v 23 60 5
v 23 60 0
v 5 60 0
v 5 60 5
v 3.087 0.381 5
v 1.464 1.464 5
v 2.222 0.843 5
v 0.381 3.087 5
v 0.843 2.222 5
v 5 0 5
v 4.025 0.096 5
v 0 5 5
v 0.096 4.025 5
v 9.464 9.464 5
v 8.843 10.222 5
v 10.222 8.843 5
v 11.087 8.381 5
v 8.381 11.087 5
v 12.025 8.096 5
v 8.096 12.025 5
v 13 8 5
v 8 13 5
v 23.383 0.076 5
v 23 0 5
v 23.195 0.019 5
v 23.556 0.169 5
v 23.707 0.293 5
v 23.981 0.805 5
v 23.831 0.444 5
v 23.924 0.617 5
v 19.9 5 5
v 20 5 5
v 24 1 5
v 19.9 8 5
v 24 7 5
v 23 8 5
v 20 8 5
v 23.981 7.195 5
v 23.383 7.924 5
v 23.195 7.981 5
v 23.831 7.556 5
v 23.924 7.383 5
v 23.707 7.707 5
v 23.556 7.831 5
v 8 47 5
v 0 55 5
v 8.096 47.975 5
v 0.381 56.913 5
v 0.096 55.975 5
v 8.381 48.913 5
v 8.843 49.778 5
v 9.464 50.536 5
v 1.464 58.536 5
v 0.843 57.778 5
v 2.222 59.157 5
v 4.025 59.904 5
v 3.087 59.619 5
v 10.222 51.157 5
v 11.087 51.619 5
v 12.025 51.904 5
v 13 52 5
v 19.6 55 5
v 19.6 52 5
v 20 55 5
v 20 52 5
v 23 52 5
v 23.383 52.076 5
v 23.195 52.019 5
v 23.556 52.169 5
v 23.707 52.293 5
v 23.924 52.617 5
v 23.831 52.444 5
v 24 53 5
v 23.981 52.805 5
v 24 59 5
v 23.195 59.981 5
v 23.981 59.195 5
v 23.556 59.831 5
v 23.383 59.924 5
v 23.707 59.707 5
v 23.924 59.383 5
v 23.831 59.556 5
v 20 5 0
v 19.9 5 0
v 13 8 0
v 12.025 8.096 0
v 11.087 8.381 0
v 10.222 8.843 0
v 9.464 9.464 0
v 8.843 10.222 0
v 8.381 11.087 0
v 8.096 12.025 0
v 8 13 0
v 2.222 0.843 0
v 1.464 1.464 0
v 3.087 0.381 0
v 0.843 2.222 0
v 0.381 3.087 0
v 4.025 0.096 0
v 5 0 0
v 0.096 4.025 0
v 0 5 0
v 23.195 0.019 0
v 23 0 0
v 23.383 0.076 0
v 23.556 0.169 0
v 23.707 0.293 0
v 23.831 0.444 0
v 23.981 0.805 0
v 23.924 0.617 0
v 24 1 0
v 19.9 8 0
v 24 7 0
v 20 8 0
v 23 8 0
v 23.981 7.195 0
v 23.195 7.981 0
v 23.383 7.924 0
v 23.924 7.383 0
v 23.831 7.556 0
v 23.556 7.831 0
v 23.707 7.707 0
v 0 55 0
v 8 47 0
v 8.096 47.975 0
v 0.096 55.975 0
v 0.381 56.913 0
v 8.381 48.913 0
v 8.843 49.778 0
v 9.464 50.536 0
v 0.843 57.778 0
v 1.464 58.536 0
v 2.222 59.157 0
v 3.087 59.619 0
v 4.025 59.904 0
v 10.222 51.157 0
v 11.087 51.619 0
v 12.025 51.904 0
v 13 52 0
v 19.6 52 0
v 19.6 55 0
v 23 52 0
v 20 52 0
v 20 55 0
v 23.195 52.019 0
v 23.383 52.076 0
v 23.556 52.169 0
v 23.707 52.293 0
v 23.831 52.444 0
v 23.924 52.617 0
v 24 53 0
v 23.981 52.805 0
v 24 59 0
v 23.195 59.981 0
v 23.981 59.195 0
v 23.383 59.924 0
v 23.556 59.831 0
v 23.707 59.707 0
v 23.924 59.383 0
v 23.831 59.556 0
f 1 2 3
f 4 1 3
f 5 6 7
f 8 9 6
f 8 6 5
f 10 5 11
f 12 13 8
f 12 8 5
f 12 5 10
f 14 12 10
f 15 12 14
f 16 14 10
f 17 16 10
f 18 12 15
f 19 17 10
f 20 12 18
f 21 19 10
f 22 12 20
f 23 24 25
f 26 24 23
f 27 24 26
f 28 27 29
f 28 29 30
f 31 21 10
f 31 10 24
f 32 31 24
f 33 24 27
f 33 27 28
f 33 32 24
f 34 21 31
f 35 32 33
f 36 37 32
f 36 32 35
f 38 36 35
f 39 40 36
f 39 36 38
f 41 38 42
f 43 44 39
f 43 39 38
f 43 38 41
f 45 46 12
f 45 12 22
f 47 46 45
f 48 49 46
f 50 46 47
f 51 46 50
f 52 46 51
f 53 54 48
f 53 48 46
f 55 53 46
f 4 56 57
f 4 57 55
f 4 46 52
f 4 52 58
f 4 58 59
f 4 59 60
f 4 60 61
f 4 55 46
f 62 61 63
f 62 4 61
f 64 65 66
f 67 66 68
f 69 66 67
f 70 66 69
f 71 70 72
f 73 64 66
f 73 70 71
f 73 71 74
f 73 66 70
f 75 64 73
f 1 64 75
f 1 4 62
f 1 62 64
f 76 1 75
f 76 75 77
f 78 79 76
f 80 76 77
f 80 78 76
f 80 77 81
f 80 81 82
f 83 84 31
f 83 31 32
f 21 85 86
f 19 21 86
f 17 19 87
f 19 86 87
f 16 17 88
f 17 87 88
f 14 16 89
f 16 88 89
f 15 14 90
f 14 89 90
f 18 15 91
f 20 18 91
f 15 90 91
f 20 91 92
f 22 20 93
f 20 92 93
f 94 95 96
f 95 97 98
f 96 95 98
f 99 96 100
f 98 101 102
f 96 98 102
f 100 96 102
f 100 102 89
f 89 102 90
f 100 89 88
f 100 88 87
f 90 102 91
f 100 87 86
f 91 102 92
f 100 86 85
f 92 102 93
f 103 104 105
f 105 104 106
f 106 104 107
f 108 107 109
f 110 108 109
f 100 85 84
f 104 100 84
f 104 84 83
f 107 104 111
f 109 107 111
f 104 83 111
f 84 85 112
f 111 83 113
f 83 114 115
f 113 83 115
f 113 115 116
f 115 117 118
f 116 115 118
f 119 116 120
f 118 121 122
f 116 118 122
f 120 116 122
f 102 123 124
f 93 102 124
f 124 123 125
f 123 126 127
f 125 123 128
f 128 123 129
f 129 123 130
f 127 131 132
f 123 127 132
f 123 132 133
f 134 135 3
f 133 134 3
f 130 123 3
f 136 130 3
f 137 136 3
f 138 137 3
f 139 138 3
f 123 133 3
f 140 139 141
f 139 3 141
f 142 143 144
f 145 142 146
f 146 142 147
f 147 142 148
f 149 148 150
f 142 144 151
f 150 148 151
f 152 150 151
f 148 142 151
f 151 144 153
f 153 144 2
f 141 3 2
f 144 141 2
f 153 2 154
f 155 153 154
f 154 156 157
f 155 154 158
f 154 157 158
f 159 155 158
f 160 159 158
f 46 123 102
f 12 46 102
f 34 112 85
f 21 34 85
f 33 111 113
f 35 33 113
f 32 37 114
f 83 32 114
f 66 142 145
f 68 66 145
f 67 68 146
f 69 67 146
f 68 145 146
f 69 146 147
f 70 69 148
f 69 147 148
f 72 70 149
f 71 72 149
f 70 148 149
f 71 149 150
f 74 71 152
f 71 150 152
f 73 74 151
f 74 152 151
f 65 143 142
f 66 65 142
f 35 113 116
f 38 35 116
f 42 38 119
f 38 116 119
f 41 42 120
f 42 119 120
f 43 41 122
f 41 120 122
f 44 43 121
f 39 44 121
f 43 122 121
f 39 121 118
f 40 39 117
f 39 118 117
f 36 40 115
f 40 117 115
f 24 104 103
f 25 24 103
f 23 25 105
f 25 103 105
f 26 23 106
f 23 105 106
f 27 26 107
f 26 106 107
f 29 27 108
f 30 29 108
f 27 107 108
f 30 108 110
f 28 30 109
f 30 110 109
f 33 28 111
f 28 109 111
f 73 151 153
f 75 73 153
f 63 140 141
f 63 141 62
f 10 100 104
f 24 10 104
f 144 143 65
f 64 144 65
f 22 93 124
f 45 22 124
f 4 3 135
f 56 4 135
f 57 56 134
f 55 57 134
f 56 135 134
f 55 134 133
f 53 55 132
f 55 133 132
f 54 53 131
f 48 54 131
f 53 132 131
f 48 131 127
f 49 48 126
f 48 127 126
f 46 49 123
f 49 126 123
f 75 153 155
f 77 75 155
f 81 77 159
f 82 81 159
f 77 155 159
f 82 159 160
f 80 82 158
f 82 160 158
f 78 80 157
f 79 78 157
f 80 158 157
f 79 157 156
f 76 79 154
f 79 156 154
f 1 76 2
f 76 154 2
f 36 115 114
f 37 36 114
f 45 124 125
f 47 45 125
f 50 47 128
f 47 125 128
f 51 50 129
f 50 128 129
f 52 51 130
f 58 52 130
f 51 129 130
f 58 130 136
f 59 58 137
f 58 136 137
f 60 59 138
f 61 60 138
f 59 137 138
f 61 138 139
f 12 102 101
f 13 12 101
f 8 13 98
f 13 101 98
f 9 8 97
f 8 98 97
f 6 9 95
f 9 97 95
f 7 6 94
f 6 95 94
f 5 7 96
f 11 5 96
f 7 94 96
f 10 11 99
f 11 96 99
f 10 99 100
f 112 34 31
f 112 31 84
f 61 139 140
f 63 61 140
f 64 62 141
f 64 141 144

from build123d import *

# Parameters (mm, degrees)
BOSS_EXTRUDE1_DEPTH = 5
SKETCH3_W           = 0.1
SKETCH3_H           = 5
CUT_EXTRUDE1_DEPTH  = 3
SKETCH4_W           = 0.4
SKETCH4_H           = 5
CUT_EXTRUDE2_DEPTH  = 3


with BuildPart() as part:
    # Sketch1 → Boss-Extrude1 (new body)
    with BuildSketch(Plane.XY):
        with BuildLine():
            Line((0, 55), (0, 5))
            ThreePointArc((0, 5), (1.464466094, 1.464466094), (5, 0))
            Line((5, 0), (23, 0))
            ThreePointArc((23, 0), (23.707106781, 0.292893219), (24, 1))
            Line((24, 1), (24, 7))
            ThreePointArc((24, 7), (23.707106781, 7.707106781), (23, 8))
            Line((23, 8), (13, 8))
            ThreePointArc((13, 8), (9.464466094, 9.464466094), (8, 13))
            Line((8, 13), (8, 47))
            ThreePointArc((8, 47), (9.464466094, 50.535533906), (13, 52))
            Line((13, 52), (23, 52))
            ThreePointArc((23, 52), (23.707106781, 52.292893219), (24, 53))
            Line((24, 53), (24, 59))
            ThreePointArc((24, 59), (23.707106781, 59.707106781), (23, 60))
            Line((23, 60), (5, 60))
            ThreePointArc((5, 60), (1.464466094, 58.535533906), (0, 55))
        make_face()
    extrude(amount=BOSS_EXTRUDE1_DEPTH)

    # Sketch3 → Cut-Extrude1 (cut)
    with BuildSketch(Plane(origin=(0, 8, 0), x_dir=(1, 0, 0), z_dir=(0, 1, 0))):
        with Locations((19.95, -2.5)):
            Rectangle(SKETCH3_W, SKETCH3_H)
    extrude(amount=-CUT_EXTRUDE1_DEPTH, mode=Mode.SUBTRACT)

    # Sketch4 → Cut-Extrude2 (cut)
    with BuildSketch(Plane.XZ.offset(-52)):
        with Locations((19.8, 2.5)):
            Rectangle(SKETCH4_W, SKETCH4_H)
    extrude(amount=-CUT_EXTRUDE2_DEPTH, mode=Mode.SUBTRACT)


solid = part.part
